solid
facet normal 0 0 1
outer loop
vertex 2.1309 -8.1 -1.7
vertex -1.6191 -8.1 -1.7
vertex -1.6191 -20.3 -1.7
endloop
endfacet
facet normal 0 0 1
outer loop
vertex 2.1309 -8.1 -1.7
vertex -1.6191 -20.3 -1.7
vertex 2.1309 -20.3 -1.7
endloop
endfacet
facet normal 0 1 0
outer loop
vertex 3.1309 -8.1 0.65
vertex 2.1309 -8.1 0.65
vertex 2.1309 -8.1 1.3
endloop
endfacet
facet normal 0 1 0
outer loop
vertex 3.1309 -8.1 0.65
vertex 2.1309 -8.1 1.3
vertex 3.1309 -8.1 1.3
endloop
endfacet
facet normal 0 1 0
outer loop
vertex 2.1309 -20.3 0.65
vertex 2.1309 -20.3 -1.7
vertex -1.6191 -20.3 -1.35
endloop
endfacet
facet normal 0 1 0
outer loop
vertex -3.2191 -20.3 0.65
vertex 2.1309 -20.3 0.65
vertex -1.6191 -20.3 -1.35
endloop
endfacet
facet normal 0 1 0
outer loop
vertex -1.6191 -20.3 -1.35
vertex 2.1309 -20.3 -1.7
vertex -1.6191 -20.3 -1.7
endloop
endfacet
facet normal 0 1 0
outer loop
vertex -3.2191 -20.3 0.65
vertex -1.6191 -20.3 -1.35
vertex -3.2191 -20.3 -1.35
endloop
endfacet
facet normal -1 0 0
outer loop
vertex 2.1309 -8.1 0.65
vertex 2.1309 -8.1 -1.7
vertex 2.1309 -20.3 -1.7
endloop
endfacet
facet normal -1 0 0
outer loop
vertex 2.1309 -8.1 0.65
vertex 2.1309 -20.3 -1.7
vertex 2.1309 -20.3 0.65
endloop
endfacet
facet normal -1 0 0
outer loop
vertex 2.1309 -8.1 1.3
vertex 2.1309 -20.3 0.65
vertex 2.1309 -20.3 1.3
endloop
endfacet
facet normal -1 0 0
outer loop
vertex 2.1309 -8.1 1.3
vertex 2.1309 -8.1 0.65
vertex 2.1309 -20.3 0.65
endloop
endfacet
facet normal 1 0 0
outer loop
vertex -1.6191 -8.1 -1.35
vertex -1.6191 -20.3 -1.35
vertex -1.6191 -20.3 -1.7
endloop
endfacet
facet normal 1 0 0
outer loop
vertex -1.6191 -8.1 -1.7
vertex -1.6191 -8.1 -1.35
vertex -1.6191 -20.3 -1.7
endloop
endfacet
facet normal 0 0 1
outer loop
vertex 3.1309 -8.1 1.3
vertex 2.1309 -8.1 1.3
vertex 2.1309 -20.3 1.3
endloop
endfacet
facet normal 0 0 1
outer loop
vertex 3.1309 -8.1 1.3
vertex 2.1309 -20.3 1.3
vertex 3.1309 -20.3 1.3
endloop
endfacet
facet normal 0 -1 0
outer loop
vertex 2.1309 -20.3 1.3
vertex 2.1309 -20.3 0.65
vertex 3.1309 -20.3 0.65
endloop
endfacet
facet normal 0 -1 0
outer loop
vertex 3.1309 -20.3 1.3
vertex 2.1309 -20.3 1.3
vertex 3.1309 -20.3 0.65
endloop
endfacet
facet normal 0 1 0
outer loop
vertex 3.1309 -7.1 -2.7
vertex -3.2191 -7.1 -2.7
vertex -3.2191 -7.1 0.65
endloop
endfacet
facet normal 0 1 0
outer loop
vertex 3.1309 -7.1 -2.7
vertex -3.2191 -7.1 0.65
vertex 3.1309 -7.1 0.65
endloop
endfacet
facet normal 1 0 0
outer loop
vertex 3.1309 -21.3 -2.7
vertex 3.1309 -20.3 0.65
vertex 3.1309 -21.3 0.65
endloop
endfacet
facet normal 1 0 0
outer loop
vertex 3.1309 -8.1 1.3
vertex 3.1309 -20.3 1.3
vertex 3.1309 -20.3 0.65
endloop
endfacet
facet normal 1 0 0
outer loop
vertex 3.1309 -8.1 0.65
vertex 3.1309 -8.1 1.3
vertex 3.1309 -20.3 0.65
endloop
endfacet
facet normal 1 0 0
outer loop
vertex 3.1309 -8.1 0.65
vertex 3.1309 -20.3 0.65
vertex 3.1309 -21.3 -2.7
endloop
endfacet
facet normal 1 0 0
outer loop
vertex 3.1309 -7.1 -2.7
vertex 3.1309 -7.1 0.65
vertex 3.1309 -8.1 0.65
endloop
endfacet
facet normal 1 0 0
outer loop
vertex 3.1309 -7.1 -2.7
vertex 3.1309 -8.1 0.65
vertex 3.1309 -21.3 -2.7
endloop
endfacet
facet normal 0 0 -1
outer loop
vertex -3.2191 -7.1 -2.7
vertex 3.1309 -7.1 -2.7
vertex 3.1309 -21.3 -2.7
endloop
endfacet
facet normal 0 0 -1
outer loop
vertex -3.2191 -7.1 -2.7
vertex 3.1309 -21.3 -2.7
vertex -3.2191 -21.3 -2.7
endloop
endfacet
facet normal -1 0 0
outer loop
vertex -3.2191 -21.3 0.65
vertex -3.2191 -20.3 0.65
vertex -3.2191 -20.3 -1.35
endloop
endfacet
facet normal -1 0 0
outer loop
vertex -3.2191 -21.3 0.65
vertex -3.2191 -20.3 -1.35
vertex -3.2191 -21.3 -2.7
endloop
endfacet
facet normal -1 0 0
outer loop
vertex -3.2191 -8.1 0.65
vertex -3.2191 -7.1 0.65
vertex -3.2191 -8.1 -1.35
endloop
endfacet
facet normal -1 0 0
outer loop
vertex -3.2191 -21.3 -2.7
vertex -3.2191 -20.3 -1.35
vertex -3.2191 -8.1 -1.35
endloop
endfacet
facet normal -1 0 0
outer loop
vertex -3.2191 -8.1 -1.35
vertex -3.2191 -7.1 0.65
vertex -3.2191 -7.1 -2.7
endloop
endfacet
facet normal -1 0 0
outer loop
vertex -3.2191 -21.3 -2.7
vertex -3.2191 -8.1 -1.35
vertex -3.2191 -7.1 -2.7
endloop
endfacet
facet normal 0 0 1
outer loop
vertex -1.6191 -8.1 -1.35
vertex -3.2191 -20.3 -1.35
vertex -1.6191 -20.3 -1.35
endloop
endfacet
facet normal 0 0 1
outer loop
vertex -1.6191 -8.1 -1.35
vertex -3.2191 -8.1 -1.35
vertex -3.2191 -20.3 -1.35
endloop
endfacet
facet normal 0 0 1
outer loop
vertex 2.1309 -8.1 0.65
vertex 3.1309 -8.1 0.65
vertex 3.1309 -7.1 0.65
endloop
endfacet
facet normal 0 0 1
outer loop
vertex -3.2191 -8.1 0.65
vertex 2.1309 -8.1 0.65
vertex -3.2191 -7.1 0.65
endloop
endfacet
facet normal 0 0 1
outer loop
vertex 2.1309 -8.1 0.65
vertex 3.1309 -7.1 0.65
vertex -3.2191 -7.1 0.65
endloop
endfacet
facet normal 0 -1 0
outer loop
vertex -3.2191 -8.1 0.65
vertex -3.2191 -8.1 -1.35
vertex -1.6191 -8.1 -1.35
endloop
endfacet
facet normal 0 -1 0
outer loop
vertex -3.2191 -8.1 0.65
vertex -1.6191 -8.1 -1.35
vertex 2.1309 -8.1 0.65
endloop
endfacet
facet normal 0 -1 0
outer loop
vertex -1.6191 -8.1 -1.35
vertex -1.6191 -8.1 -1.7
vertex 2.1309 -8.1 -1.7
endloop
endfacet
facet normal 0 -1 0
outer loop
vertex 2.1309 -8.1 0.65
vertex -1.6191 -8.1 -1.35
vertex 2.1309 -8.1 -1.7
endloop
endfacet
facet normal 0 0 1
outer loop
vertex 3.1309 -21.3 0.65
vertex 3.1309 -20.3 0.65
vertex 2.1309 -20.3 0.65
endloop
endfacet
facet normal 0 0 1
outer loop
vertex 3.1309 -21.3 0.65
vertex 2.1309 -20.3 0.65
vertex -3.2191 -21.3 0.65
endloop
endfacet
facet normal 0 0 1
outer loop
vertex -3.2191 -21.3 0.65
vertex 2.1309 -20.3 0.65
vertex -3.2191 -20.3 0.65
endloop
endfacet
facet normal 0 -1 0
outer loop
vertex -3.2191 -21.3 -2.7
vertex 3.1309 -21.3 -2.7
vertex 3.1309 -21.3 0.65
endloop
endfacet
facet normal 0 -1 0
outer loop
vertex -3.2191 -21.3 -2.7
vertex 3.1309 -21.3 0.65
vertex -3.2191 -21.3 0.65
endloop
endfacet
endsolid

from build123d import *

# Parameters (mm, degrees)
F1_DEPTH = 6.1
F2_DEPTH = 0.65
F3_W     = 6.35
F3_H     = 3.35
F4_DEPTH = 1
F5_W     = 6.35
F5_H     = 3.35
F6_DEPTH = 1
F7_ANGLE = 180
F8_DEPTH = 1


with BuildPart() as f1:
    # F0 (on Front) → F1 (new body, symmetric)
    with BuildSketch(Plane.XZ):
        Polygon((-3.2191018649, 0), (-2.2191018649, 0), (-2.2191018649, 2.65), (-1.6191018649, 2.65), (-1.6191018649, 3), (2.1308981351, 3), (2.1308981351, 0), (3.1308981351, 0), (3.1308981351, 4), (-3.2191018649, 4), align=None)
    extrude(amount=F1_DEPTH, both=True)

    # F2 (cut): a face of the model
    f2_faces = [f1.faces().sort_by_distance(p)[0] for p in [
        (-2.7191018649, 0, 0),
    ]]
    extrude(f2_faces, amount=-F2_DEPTH, mode=Mode.SUBTRACT)

    # F3 (on face) → F4 (join)
    with BuildSketch(Plane.XZ.offset(6.1)):
        with Locations((-0.0441018649, 2.325)):
            Rectangle(F3_W, F3_H)
    extrude(amount=F4_DEPTH)

    # F5 (on face) → F6 (join)
    with BuildSketch(Plane(origin=(0, 6.1, 0), x_dir=(-1, 0, 0), z_dir=(0, 1, 0))):
        with Locations((0.0441018649, 2.325)):
            Rectangle(F5_W, F5_H)
    extrude(amount=F6_DEPTH)


with BuildPart() as f1_1:
    # F7: moved
    add(f1.part.rotate(Axis((-0.0441018649, -7.1, 0.65), (1, 0, 0)), F7_ANGLE))

    # F8 (cut, through all): a face of the model
    f8_faces = [f1_1.faces().sort_by_distance(p)[0] for p in [
        (-2.2191018649, -14.2, -0.35),
    ]]
    extrude(f8_faces, amount=-F8_DEPTH, mode=Mode.SUBTRACT)


solid = f1_1.part
